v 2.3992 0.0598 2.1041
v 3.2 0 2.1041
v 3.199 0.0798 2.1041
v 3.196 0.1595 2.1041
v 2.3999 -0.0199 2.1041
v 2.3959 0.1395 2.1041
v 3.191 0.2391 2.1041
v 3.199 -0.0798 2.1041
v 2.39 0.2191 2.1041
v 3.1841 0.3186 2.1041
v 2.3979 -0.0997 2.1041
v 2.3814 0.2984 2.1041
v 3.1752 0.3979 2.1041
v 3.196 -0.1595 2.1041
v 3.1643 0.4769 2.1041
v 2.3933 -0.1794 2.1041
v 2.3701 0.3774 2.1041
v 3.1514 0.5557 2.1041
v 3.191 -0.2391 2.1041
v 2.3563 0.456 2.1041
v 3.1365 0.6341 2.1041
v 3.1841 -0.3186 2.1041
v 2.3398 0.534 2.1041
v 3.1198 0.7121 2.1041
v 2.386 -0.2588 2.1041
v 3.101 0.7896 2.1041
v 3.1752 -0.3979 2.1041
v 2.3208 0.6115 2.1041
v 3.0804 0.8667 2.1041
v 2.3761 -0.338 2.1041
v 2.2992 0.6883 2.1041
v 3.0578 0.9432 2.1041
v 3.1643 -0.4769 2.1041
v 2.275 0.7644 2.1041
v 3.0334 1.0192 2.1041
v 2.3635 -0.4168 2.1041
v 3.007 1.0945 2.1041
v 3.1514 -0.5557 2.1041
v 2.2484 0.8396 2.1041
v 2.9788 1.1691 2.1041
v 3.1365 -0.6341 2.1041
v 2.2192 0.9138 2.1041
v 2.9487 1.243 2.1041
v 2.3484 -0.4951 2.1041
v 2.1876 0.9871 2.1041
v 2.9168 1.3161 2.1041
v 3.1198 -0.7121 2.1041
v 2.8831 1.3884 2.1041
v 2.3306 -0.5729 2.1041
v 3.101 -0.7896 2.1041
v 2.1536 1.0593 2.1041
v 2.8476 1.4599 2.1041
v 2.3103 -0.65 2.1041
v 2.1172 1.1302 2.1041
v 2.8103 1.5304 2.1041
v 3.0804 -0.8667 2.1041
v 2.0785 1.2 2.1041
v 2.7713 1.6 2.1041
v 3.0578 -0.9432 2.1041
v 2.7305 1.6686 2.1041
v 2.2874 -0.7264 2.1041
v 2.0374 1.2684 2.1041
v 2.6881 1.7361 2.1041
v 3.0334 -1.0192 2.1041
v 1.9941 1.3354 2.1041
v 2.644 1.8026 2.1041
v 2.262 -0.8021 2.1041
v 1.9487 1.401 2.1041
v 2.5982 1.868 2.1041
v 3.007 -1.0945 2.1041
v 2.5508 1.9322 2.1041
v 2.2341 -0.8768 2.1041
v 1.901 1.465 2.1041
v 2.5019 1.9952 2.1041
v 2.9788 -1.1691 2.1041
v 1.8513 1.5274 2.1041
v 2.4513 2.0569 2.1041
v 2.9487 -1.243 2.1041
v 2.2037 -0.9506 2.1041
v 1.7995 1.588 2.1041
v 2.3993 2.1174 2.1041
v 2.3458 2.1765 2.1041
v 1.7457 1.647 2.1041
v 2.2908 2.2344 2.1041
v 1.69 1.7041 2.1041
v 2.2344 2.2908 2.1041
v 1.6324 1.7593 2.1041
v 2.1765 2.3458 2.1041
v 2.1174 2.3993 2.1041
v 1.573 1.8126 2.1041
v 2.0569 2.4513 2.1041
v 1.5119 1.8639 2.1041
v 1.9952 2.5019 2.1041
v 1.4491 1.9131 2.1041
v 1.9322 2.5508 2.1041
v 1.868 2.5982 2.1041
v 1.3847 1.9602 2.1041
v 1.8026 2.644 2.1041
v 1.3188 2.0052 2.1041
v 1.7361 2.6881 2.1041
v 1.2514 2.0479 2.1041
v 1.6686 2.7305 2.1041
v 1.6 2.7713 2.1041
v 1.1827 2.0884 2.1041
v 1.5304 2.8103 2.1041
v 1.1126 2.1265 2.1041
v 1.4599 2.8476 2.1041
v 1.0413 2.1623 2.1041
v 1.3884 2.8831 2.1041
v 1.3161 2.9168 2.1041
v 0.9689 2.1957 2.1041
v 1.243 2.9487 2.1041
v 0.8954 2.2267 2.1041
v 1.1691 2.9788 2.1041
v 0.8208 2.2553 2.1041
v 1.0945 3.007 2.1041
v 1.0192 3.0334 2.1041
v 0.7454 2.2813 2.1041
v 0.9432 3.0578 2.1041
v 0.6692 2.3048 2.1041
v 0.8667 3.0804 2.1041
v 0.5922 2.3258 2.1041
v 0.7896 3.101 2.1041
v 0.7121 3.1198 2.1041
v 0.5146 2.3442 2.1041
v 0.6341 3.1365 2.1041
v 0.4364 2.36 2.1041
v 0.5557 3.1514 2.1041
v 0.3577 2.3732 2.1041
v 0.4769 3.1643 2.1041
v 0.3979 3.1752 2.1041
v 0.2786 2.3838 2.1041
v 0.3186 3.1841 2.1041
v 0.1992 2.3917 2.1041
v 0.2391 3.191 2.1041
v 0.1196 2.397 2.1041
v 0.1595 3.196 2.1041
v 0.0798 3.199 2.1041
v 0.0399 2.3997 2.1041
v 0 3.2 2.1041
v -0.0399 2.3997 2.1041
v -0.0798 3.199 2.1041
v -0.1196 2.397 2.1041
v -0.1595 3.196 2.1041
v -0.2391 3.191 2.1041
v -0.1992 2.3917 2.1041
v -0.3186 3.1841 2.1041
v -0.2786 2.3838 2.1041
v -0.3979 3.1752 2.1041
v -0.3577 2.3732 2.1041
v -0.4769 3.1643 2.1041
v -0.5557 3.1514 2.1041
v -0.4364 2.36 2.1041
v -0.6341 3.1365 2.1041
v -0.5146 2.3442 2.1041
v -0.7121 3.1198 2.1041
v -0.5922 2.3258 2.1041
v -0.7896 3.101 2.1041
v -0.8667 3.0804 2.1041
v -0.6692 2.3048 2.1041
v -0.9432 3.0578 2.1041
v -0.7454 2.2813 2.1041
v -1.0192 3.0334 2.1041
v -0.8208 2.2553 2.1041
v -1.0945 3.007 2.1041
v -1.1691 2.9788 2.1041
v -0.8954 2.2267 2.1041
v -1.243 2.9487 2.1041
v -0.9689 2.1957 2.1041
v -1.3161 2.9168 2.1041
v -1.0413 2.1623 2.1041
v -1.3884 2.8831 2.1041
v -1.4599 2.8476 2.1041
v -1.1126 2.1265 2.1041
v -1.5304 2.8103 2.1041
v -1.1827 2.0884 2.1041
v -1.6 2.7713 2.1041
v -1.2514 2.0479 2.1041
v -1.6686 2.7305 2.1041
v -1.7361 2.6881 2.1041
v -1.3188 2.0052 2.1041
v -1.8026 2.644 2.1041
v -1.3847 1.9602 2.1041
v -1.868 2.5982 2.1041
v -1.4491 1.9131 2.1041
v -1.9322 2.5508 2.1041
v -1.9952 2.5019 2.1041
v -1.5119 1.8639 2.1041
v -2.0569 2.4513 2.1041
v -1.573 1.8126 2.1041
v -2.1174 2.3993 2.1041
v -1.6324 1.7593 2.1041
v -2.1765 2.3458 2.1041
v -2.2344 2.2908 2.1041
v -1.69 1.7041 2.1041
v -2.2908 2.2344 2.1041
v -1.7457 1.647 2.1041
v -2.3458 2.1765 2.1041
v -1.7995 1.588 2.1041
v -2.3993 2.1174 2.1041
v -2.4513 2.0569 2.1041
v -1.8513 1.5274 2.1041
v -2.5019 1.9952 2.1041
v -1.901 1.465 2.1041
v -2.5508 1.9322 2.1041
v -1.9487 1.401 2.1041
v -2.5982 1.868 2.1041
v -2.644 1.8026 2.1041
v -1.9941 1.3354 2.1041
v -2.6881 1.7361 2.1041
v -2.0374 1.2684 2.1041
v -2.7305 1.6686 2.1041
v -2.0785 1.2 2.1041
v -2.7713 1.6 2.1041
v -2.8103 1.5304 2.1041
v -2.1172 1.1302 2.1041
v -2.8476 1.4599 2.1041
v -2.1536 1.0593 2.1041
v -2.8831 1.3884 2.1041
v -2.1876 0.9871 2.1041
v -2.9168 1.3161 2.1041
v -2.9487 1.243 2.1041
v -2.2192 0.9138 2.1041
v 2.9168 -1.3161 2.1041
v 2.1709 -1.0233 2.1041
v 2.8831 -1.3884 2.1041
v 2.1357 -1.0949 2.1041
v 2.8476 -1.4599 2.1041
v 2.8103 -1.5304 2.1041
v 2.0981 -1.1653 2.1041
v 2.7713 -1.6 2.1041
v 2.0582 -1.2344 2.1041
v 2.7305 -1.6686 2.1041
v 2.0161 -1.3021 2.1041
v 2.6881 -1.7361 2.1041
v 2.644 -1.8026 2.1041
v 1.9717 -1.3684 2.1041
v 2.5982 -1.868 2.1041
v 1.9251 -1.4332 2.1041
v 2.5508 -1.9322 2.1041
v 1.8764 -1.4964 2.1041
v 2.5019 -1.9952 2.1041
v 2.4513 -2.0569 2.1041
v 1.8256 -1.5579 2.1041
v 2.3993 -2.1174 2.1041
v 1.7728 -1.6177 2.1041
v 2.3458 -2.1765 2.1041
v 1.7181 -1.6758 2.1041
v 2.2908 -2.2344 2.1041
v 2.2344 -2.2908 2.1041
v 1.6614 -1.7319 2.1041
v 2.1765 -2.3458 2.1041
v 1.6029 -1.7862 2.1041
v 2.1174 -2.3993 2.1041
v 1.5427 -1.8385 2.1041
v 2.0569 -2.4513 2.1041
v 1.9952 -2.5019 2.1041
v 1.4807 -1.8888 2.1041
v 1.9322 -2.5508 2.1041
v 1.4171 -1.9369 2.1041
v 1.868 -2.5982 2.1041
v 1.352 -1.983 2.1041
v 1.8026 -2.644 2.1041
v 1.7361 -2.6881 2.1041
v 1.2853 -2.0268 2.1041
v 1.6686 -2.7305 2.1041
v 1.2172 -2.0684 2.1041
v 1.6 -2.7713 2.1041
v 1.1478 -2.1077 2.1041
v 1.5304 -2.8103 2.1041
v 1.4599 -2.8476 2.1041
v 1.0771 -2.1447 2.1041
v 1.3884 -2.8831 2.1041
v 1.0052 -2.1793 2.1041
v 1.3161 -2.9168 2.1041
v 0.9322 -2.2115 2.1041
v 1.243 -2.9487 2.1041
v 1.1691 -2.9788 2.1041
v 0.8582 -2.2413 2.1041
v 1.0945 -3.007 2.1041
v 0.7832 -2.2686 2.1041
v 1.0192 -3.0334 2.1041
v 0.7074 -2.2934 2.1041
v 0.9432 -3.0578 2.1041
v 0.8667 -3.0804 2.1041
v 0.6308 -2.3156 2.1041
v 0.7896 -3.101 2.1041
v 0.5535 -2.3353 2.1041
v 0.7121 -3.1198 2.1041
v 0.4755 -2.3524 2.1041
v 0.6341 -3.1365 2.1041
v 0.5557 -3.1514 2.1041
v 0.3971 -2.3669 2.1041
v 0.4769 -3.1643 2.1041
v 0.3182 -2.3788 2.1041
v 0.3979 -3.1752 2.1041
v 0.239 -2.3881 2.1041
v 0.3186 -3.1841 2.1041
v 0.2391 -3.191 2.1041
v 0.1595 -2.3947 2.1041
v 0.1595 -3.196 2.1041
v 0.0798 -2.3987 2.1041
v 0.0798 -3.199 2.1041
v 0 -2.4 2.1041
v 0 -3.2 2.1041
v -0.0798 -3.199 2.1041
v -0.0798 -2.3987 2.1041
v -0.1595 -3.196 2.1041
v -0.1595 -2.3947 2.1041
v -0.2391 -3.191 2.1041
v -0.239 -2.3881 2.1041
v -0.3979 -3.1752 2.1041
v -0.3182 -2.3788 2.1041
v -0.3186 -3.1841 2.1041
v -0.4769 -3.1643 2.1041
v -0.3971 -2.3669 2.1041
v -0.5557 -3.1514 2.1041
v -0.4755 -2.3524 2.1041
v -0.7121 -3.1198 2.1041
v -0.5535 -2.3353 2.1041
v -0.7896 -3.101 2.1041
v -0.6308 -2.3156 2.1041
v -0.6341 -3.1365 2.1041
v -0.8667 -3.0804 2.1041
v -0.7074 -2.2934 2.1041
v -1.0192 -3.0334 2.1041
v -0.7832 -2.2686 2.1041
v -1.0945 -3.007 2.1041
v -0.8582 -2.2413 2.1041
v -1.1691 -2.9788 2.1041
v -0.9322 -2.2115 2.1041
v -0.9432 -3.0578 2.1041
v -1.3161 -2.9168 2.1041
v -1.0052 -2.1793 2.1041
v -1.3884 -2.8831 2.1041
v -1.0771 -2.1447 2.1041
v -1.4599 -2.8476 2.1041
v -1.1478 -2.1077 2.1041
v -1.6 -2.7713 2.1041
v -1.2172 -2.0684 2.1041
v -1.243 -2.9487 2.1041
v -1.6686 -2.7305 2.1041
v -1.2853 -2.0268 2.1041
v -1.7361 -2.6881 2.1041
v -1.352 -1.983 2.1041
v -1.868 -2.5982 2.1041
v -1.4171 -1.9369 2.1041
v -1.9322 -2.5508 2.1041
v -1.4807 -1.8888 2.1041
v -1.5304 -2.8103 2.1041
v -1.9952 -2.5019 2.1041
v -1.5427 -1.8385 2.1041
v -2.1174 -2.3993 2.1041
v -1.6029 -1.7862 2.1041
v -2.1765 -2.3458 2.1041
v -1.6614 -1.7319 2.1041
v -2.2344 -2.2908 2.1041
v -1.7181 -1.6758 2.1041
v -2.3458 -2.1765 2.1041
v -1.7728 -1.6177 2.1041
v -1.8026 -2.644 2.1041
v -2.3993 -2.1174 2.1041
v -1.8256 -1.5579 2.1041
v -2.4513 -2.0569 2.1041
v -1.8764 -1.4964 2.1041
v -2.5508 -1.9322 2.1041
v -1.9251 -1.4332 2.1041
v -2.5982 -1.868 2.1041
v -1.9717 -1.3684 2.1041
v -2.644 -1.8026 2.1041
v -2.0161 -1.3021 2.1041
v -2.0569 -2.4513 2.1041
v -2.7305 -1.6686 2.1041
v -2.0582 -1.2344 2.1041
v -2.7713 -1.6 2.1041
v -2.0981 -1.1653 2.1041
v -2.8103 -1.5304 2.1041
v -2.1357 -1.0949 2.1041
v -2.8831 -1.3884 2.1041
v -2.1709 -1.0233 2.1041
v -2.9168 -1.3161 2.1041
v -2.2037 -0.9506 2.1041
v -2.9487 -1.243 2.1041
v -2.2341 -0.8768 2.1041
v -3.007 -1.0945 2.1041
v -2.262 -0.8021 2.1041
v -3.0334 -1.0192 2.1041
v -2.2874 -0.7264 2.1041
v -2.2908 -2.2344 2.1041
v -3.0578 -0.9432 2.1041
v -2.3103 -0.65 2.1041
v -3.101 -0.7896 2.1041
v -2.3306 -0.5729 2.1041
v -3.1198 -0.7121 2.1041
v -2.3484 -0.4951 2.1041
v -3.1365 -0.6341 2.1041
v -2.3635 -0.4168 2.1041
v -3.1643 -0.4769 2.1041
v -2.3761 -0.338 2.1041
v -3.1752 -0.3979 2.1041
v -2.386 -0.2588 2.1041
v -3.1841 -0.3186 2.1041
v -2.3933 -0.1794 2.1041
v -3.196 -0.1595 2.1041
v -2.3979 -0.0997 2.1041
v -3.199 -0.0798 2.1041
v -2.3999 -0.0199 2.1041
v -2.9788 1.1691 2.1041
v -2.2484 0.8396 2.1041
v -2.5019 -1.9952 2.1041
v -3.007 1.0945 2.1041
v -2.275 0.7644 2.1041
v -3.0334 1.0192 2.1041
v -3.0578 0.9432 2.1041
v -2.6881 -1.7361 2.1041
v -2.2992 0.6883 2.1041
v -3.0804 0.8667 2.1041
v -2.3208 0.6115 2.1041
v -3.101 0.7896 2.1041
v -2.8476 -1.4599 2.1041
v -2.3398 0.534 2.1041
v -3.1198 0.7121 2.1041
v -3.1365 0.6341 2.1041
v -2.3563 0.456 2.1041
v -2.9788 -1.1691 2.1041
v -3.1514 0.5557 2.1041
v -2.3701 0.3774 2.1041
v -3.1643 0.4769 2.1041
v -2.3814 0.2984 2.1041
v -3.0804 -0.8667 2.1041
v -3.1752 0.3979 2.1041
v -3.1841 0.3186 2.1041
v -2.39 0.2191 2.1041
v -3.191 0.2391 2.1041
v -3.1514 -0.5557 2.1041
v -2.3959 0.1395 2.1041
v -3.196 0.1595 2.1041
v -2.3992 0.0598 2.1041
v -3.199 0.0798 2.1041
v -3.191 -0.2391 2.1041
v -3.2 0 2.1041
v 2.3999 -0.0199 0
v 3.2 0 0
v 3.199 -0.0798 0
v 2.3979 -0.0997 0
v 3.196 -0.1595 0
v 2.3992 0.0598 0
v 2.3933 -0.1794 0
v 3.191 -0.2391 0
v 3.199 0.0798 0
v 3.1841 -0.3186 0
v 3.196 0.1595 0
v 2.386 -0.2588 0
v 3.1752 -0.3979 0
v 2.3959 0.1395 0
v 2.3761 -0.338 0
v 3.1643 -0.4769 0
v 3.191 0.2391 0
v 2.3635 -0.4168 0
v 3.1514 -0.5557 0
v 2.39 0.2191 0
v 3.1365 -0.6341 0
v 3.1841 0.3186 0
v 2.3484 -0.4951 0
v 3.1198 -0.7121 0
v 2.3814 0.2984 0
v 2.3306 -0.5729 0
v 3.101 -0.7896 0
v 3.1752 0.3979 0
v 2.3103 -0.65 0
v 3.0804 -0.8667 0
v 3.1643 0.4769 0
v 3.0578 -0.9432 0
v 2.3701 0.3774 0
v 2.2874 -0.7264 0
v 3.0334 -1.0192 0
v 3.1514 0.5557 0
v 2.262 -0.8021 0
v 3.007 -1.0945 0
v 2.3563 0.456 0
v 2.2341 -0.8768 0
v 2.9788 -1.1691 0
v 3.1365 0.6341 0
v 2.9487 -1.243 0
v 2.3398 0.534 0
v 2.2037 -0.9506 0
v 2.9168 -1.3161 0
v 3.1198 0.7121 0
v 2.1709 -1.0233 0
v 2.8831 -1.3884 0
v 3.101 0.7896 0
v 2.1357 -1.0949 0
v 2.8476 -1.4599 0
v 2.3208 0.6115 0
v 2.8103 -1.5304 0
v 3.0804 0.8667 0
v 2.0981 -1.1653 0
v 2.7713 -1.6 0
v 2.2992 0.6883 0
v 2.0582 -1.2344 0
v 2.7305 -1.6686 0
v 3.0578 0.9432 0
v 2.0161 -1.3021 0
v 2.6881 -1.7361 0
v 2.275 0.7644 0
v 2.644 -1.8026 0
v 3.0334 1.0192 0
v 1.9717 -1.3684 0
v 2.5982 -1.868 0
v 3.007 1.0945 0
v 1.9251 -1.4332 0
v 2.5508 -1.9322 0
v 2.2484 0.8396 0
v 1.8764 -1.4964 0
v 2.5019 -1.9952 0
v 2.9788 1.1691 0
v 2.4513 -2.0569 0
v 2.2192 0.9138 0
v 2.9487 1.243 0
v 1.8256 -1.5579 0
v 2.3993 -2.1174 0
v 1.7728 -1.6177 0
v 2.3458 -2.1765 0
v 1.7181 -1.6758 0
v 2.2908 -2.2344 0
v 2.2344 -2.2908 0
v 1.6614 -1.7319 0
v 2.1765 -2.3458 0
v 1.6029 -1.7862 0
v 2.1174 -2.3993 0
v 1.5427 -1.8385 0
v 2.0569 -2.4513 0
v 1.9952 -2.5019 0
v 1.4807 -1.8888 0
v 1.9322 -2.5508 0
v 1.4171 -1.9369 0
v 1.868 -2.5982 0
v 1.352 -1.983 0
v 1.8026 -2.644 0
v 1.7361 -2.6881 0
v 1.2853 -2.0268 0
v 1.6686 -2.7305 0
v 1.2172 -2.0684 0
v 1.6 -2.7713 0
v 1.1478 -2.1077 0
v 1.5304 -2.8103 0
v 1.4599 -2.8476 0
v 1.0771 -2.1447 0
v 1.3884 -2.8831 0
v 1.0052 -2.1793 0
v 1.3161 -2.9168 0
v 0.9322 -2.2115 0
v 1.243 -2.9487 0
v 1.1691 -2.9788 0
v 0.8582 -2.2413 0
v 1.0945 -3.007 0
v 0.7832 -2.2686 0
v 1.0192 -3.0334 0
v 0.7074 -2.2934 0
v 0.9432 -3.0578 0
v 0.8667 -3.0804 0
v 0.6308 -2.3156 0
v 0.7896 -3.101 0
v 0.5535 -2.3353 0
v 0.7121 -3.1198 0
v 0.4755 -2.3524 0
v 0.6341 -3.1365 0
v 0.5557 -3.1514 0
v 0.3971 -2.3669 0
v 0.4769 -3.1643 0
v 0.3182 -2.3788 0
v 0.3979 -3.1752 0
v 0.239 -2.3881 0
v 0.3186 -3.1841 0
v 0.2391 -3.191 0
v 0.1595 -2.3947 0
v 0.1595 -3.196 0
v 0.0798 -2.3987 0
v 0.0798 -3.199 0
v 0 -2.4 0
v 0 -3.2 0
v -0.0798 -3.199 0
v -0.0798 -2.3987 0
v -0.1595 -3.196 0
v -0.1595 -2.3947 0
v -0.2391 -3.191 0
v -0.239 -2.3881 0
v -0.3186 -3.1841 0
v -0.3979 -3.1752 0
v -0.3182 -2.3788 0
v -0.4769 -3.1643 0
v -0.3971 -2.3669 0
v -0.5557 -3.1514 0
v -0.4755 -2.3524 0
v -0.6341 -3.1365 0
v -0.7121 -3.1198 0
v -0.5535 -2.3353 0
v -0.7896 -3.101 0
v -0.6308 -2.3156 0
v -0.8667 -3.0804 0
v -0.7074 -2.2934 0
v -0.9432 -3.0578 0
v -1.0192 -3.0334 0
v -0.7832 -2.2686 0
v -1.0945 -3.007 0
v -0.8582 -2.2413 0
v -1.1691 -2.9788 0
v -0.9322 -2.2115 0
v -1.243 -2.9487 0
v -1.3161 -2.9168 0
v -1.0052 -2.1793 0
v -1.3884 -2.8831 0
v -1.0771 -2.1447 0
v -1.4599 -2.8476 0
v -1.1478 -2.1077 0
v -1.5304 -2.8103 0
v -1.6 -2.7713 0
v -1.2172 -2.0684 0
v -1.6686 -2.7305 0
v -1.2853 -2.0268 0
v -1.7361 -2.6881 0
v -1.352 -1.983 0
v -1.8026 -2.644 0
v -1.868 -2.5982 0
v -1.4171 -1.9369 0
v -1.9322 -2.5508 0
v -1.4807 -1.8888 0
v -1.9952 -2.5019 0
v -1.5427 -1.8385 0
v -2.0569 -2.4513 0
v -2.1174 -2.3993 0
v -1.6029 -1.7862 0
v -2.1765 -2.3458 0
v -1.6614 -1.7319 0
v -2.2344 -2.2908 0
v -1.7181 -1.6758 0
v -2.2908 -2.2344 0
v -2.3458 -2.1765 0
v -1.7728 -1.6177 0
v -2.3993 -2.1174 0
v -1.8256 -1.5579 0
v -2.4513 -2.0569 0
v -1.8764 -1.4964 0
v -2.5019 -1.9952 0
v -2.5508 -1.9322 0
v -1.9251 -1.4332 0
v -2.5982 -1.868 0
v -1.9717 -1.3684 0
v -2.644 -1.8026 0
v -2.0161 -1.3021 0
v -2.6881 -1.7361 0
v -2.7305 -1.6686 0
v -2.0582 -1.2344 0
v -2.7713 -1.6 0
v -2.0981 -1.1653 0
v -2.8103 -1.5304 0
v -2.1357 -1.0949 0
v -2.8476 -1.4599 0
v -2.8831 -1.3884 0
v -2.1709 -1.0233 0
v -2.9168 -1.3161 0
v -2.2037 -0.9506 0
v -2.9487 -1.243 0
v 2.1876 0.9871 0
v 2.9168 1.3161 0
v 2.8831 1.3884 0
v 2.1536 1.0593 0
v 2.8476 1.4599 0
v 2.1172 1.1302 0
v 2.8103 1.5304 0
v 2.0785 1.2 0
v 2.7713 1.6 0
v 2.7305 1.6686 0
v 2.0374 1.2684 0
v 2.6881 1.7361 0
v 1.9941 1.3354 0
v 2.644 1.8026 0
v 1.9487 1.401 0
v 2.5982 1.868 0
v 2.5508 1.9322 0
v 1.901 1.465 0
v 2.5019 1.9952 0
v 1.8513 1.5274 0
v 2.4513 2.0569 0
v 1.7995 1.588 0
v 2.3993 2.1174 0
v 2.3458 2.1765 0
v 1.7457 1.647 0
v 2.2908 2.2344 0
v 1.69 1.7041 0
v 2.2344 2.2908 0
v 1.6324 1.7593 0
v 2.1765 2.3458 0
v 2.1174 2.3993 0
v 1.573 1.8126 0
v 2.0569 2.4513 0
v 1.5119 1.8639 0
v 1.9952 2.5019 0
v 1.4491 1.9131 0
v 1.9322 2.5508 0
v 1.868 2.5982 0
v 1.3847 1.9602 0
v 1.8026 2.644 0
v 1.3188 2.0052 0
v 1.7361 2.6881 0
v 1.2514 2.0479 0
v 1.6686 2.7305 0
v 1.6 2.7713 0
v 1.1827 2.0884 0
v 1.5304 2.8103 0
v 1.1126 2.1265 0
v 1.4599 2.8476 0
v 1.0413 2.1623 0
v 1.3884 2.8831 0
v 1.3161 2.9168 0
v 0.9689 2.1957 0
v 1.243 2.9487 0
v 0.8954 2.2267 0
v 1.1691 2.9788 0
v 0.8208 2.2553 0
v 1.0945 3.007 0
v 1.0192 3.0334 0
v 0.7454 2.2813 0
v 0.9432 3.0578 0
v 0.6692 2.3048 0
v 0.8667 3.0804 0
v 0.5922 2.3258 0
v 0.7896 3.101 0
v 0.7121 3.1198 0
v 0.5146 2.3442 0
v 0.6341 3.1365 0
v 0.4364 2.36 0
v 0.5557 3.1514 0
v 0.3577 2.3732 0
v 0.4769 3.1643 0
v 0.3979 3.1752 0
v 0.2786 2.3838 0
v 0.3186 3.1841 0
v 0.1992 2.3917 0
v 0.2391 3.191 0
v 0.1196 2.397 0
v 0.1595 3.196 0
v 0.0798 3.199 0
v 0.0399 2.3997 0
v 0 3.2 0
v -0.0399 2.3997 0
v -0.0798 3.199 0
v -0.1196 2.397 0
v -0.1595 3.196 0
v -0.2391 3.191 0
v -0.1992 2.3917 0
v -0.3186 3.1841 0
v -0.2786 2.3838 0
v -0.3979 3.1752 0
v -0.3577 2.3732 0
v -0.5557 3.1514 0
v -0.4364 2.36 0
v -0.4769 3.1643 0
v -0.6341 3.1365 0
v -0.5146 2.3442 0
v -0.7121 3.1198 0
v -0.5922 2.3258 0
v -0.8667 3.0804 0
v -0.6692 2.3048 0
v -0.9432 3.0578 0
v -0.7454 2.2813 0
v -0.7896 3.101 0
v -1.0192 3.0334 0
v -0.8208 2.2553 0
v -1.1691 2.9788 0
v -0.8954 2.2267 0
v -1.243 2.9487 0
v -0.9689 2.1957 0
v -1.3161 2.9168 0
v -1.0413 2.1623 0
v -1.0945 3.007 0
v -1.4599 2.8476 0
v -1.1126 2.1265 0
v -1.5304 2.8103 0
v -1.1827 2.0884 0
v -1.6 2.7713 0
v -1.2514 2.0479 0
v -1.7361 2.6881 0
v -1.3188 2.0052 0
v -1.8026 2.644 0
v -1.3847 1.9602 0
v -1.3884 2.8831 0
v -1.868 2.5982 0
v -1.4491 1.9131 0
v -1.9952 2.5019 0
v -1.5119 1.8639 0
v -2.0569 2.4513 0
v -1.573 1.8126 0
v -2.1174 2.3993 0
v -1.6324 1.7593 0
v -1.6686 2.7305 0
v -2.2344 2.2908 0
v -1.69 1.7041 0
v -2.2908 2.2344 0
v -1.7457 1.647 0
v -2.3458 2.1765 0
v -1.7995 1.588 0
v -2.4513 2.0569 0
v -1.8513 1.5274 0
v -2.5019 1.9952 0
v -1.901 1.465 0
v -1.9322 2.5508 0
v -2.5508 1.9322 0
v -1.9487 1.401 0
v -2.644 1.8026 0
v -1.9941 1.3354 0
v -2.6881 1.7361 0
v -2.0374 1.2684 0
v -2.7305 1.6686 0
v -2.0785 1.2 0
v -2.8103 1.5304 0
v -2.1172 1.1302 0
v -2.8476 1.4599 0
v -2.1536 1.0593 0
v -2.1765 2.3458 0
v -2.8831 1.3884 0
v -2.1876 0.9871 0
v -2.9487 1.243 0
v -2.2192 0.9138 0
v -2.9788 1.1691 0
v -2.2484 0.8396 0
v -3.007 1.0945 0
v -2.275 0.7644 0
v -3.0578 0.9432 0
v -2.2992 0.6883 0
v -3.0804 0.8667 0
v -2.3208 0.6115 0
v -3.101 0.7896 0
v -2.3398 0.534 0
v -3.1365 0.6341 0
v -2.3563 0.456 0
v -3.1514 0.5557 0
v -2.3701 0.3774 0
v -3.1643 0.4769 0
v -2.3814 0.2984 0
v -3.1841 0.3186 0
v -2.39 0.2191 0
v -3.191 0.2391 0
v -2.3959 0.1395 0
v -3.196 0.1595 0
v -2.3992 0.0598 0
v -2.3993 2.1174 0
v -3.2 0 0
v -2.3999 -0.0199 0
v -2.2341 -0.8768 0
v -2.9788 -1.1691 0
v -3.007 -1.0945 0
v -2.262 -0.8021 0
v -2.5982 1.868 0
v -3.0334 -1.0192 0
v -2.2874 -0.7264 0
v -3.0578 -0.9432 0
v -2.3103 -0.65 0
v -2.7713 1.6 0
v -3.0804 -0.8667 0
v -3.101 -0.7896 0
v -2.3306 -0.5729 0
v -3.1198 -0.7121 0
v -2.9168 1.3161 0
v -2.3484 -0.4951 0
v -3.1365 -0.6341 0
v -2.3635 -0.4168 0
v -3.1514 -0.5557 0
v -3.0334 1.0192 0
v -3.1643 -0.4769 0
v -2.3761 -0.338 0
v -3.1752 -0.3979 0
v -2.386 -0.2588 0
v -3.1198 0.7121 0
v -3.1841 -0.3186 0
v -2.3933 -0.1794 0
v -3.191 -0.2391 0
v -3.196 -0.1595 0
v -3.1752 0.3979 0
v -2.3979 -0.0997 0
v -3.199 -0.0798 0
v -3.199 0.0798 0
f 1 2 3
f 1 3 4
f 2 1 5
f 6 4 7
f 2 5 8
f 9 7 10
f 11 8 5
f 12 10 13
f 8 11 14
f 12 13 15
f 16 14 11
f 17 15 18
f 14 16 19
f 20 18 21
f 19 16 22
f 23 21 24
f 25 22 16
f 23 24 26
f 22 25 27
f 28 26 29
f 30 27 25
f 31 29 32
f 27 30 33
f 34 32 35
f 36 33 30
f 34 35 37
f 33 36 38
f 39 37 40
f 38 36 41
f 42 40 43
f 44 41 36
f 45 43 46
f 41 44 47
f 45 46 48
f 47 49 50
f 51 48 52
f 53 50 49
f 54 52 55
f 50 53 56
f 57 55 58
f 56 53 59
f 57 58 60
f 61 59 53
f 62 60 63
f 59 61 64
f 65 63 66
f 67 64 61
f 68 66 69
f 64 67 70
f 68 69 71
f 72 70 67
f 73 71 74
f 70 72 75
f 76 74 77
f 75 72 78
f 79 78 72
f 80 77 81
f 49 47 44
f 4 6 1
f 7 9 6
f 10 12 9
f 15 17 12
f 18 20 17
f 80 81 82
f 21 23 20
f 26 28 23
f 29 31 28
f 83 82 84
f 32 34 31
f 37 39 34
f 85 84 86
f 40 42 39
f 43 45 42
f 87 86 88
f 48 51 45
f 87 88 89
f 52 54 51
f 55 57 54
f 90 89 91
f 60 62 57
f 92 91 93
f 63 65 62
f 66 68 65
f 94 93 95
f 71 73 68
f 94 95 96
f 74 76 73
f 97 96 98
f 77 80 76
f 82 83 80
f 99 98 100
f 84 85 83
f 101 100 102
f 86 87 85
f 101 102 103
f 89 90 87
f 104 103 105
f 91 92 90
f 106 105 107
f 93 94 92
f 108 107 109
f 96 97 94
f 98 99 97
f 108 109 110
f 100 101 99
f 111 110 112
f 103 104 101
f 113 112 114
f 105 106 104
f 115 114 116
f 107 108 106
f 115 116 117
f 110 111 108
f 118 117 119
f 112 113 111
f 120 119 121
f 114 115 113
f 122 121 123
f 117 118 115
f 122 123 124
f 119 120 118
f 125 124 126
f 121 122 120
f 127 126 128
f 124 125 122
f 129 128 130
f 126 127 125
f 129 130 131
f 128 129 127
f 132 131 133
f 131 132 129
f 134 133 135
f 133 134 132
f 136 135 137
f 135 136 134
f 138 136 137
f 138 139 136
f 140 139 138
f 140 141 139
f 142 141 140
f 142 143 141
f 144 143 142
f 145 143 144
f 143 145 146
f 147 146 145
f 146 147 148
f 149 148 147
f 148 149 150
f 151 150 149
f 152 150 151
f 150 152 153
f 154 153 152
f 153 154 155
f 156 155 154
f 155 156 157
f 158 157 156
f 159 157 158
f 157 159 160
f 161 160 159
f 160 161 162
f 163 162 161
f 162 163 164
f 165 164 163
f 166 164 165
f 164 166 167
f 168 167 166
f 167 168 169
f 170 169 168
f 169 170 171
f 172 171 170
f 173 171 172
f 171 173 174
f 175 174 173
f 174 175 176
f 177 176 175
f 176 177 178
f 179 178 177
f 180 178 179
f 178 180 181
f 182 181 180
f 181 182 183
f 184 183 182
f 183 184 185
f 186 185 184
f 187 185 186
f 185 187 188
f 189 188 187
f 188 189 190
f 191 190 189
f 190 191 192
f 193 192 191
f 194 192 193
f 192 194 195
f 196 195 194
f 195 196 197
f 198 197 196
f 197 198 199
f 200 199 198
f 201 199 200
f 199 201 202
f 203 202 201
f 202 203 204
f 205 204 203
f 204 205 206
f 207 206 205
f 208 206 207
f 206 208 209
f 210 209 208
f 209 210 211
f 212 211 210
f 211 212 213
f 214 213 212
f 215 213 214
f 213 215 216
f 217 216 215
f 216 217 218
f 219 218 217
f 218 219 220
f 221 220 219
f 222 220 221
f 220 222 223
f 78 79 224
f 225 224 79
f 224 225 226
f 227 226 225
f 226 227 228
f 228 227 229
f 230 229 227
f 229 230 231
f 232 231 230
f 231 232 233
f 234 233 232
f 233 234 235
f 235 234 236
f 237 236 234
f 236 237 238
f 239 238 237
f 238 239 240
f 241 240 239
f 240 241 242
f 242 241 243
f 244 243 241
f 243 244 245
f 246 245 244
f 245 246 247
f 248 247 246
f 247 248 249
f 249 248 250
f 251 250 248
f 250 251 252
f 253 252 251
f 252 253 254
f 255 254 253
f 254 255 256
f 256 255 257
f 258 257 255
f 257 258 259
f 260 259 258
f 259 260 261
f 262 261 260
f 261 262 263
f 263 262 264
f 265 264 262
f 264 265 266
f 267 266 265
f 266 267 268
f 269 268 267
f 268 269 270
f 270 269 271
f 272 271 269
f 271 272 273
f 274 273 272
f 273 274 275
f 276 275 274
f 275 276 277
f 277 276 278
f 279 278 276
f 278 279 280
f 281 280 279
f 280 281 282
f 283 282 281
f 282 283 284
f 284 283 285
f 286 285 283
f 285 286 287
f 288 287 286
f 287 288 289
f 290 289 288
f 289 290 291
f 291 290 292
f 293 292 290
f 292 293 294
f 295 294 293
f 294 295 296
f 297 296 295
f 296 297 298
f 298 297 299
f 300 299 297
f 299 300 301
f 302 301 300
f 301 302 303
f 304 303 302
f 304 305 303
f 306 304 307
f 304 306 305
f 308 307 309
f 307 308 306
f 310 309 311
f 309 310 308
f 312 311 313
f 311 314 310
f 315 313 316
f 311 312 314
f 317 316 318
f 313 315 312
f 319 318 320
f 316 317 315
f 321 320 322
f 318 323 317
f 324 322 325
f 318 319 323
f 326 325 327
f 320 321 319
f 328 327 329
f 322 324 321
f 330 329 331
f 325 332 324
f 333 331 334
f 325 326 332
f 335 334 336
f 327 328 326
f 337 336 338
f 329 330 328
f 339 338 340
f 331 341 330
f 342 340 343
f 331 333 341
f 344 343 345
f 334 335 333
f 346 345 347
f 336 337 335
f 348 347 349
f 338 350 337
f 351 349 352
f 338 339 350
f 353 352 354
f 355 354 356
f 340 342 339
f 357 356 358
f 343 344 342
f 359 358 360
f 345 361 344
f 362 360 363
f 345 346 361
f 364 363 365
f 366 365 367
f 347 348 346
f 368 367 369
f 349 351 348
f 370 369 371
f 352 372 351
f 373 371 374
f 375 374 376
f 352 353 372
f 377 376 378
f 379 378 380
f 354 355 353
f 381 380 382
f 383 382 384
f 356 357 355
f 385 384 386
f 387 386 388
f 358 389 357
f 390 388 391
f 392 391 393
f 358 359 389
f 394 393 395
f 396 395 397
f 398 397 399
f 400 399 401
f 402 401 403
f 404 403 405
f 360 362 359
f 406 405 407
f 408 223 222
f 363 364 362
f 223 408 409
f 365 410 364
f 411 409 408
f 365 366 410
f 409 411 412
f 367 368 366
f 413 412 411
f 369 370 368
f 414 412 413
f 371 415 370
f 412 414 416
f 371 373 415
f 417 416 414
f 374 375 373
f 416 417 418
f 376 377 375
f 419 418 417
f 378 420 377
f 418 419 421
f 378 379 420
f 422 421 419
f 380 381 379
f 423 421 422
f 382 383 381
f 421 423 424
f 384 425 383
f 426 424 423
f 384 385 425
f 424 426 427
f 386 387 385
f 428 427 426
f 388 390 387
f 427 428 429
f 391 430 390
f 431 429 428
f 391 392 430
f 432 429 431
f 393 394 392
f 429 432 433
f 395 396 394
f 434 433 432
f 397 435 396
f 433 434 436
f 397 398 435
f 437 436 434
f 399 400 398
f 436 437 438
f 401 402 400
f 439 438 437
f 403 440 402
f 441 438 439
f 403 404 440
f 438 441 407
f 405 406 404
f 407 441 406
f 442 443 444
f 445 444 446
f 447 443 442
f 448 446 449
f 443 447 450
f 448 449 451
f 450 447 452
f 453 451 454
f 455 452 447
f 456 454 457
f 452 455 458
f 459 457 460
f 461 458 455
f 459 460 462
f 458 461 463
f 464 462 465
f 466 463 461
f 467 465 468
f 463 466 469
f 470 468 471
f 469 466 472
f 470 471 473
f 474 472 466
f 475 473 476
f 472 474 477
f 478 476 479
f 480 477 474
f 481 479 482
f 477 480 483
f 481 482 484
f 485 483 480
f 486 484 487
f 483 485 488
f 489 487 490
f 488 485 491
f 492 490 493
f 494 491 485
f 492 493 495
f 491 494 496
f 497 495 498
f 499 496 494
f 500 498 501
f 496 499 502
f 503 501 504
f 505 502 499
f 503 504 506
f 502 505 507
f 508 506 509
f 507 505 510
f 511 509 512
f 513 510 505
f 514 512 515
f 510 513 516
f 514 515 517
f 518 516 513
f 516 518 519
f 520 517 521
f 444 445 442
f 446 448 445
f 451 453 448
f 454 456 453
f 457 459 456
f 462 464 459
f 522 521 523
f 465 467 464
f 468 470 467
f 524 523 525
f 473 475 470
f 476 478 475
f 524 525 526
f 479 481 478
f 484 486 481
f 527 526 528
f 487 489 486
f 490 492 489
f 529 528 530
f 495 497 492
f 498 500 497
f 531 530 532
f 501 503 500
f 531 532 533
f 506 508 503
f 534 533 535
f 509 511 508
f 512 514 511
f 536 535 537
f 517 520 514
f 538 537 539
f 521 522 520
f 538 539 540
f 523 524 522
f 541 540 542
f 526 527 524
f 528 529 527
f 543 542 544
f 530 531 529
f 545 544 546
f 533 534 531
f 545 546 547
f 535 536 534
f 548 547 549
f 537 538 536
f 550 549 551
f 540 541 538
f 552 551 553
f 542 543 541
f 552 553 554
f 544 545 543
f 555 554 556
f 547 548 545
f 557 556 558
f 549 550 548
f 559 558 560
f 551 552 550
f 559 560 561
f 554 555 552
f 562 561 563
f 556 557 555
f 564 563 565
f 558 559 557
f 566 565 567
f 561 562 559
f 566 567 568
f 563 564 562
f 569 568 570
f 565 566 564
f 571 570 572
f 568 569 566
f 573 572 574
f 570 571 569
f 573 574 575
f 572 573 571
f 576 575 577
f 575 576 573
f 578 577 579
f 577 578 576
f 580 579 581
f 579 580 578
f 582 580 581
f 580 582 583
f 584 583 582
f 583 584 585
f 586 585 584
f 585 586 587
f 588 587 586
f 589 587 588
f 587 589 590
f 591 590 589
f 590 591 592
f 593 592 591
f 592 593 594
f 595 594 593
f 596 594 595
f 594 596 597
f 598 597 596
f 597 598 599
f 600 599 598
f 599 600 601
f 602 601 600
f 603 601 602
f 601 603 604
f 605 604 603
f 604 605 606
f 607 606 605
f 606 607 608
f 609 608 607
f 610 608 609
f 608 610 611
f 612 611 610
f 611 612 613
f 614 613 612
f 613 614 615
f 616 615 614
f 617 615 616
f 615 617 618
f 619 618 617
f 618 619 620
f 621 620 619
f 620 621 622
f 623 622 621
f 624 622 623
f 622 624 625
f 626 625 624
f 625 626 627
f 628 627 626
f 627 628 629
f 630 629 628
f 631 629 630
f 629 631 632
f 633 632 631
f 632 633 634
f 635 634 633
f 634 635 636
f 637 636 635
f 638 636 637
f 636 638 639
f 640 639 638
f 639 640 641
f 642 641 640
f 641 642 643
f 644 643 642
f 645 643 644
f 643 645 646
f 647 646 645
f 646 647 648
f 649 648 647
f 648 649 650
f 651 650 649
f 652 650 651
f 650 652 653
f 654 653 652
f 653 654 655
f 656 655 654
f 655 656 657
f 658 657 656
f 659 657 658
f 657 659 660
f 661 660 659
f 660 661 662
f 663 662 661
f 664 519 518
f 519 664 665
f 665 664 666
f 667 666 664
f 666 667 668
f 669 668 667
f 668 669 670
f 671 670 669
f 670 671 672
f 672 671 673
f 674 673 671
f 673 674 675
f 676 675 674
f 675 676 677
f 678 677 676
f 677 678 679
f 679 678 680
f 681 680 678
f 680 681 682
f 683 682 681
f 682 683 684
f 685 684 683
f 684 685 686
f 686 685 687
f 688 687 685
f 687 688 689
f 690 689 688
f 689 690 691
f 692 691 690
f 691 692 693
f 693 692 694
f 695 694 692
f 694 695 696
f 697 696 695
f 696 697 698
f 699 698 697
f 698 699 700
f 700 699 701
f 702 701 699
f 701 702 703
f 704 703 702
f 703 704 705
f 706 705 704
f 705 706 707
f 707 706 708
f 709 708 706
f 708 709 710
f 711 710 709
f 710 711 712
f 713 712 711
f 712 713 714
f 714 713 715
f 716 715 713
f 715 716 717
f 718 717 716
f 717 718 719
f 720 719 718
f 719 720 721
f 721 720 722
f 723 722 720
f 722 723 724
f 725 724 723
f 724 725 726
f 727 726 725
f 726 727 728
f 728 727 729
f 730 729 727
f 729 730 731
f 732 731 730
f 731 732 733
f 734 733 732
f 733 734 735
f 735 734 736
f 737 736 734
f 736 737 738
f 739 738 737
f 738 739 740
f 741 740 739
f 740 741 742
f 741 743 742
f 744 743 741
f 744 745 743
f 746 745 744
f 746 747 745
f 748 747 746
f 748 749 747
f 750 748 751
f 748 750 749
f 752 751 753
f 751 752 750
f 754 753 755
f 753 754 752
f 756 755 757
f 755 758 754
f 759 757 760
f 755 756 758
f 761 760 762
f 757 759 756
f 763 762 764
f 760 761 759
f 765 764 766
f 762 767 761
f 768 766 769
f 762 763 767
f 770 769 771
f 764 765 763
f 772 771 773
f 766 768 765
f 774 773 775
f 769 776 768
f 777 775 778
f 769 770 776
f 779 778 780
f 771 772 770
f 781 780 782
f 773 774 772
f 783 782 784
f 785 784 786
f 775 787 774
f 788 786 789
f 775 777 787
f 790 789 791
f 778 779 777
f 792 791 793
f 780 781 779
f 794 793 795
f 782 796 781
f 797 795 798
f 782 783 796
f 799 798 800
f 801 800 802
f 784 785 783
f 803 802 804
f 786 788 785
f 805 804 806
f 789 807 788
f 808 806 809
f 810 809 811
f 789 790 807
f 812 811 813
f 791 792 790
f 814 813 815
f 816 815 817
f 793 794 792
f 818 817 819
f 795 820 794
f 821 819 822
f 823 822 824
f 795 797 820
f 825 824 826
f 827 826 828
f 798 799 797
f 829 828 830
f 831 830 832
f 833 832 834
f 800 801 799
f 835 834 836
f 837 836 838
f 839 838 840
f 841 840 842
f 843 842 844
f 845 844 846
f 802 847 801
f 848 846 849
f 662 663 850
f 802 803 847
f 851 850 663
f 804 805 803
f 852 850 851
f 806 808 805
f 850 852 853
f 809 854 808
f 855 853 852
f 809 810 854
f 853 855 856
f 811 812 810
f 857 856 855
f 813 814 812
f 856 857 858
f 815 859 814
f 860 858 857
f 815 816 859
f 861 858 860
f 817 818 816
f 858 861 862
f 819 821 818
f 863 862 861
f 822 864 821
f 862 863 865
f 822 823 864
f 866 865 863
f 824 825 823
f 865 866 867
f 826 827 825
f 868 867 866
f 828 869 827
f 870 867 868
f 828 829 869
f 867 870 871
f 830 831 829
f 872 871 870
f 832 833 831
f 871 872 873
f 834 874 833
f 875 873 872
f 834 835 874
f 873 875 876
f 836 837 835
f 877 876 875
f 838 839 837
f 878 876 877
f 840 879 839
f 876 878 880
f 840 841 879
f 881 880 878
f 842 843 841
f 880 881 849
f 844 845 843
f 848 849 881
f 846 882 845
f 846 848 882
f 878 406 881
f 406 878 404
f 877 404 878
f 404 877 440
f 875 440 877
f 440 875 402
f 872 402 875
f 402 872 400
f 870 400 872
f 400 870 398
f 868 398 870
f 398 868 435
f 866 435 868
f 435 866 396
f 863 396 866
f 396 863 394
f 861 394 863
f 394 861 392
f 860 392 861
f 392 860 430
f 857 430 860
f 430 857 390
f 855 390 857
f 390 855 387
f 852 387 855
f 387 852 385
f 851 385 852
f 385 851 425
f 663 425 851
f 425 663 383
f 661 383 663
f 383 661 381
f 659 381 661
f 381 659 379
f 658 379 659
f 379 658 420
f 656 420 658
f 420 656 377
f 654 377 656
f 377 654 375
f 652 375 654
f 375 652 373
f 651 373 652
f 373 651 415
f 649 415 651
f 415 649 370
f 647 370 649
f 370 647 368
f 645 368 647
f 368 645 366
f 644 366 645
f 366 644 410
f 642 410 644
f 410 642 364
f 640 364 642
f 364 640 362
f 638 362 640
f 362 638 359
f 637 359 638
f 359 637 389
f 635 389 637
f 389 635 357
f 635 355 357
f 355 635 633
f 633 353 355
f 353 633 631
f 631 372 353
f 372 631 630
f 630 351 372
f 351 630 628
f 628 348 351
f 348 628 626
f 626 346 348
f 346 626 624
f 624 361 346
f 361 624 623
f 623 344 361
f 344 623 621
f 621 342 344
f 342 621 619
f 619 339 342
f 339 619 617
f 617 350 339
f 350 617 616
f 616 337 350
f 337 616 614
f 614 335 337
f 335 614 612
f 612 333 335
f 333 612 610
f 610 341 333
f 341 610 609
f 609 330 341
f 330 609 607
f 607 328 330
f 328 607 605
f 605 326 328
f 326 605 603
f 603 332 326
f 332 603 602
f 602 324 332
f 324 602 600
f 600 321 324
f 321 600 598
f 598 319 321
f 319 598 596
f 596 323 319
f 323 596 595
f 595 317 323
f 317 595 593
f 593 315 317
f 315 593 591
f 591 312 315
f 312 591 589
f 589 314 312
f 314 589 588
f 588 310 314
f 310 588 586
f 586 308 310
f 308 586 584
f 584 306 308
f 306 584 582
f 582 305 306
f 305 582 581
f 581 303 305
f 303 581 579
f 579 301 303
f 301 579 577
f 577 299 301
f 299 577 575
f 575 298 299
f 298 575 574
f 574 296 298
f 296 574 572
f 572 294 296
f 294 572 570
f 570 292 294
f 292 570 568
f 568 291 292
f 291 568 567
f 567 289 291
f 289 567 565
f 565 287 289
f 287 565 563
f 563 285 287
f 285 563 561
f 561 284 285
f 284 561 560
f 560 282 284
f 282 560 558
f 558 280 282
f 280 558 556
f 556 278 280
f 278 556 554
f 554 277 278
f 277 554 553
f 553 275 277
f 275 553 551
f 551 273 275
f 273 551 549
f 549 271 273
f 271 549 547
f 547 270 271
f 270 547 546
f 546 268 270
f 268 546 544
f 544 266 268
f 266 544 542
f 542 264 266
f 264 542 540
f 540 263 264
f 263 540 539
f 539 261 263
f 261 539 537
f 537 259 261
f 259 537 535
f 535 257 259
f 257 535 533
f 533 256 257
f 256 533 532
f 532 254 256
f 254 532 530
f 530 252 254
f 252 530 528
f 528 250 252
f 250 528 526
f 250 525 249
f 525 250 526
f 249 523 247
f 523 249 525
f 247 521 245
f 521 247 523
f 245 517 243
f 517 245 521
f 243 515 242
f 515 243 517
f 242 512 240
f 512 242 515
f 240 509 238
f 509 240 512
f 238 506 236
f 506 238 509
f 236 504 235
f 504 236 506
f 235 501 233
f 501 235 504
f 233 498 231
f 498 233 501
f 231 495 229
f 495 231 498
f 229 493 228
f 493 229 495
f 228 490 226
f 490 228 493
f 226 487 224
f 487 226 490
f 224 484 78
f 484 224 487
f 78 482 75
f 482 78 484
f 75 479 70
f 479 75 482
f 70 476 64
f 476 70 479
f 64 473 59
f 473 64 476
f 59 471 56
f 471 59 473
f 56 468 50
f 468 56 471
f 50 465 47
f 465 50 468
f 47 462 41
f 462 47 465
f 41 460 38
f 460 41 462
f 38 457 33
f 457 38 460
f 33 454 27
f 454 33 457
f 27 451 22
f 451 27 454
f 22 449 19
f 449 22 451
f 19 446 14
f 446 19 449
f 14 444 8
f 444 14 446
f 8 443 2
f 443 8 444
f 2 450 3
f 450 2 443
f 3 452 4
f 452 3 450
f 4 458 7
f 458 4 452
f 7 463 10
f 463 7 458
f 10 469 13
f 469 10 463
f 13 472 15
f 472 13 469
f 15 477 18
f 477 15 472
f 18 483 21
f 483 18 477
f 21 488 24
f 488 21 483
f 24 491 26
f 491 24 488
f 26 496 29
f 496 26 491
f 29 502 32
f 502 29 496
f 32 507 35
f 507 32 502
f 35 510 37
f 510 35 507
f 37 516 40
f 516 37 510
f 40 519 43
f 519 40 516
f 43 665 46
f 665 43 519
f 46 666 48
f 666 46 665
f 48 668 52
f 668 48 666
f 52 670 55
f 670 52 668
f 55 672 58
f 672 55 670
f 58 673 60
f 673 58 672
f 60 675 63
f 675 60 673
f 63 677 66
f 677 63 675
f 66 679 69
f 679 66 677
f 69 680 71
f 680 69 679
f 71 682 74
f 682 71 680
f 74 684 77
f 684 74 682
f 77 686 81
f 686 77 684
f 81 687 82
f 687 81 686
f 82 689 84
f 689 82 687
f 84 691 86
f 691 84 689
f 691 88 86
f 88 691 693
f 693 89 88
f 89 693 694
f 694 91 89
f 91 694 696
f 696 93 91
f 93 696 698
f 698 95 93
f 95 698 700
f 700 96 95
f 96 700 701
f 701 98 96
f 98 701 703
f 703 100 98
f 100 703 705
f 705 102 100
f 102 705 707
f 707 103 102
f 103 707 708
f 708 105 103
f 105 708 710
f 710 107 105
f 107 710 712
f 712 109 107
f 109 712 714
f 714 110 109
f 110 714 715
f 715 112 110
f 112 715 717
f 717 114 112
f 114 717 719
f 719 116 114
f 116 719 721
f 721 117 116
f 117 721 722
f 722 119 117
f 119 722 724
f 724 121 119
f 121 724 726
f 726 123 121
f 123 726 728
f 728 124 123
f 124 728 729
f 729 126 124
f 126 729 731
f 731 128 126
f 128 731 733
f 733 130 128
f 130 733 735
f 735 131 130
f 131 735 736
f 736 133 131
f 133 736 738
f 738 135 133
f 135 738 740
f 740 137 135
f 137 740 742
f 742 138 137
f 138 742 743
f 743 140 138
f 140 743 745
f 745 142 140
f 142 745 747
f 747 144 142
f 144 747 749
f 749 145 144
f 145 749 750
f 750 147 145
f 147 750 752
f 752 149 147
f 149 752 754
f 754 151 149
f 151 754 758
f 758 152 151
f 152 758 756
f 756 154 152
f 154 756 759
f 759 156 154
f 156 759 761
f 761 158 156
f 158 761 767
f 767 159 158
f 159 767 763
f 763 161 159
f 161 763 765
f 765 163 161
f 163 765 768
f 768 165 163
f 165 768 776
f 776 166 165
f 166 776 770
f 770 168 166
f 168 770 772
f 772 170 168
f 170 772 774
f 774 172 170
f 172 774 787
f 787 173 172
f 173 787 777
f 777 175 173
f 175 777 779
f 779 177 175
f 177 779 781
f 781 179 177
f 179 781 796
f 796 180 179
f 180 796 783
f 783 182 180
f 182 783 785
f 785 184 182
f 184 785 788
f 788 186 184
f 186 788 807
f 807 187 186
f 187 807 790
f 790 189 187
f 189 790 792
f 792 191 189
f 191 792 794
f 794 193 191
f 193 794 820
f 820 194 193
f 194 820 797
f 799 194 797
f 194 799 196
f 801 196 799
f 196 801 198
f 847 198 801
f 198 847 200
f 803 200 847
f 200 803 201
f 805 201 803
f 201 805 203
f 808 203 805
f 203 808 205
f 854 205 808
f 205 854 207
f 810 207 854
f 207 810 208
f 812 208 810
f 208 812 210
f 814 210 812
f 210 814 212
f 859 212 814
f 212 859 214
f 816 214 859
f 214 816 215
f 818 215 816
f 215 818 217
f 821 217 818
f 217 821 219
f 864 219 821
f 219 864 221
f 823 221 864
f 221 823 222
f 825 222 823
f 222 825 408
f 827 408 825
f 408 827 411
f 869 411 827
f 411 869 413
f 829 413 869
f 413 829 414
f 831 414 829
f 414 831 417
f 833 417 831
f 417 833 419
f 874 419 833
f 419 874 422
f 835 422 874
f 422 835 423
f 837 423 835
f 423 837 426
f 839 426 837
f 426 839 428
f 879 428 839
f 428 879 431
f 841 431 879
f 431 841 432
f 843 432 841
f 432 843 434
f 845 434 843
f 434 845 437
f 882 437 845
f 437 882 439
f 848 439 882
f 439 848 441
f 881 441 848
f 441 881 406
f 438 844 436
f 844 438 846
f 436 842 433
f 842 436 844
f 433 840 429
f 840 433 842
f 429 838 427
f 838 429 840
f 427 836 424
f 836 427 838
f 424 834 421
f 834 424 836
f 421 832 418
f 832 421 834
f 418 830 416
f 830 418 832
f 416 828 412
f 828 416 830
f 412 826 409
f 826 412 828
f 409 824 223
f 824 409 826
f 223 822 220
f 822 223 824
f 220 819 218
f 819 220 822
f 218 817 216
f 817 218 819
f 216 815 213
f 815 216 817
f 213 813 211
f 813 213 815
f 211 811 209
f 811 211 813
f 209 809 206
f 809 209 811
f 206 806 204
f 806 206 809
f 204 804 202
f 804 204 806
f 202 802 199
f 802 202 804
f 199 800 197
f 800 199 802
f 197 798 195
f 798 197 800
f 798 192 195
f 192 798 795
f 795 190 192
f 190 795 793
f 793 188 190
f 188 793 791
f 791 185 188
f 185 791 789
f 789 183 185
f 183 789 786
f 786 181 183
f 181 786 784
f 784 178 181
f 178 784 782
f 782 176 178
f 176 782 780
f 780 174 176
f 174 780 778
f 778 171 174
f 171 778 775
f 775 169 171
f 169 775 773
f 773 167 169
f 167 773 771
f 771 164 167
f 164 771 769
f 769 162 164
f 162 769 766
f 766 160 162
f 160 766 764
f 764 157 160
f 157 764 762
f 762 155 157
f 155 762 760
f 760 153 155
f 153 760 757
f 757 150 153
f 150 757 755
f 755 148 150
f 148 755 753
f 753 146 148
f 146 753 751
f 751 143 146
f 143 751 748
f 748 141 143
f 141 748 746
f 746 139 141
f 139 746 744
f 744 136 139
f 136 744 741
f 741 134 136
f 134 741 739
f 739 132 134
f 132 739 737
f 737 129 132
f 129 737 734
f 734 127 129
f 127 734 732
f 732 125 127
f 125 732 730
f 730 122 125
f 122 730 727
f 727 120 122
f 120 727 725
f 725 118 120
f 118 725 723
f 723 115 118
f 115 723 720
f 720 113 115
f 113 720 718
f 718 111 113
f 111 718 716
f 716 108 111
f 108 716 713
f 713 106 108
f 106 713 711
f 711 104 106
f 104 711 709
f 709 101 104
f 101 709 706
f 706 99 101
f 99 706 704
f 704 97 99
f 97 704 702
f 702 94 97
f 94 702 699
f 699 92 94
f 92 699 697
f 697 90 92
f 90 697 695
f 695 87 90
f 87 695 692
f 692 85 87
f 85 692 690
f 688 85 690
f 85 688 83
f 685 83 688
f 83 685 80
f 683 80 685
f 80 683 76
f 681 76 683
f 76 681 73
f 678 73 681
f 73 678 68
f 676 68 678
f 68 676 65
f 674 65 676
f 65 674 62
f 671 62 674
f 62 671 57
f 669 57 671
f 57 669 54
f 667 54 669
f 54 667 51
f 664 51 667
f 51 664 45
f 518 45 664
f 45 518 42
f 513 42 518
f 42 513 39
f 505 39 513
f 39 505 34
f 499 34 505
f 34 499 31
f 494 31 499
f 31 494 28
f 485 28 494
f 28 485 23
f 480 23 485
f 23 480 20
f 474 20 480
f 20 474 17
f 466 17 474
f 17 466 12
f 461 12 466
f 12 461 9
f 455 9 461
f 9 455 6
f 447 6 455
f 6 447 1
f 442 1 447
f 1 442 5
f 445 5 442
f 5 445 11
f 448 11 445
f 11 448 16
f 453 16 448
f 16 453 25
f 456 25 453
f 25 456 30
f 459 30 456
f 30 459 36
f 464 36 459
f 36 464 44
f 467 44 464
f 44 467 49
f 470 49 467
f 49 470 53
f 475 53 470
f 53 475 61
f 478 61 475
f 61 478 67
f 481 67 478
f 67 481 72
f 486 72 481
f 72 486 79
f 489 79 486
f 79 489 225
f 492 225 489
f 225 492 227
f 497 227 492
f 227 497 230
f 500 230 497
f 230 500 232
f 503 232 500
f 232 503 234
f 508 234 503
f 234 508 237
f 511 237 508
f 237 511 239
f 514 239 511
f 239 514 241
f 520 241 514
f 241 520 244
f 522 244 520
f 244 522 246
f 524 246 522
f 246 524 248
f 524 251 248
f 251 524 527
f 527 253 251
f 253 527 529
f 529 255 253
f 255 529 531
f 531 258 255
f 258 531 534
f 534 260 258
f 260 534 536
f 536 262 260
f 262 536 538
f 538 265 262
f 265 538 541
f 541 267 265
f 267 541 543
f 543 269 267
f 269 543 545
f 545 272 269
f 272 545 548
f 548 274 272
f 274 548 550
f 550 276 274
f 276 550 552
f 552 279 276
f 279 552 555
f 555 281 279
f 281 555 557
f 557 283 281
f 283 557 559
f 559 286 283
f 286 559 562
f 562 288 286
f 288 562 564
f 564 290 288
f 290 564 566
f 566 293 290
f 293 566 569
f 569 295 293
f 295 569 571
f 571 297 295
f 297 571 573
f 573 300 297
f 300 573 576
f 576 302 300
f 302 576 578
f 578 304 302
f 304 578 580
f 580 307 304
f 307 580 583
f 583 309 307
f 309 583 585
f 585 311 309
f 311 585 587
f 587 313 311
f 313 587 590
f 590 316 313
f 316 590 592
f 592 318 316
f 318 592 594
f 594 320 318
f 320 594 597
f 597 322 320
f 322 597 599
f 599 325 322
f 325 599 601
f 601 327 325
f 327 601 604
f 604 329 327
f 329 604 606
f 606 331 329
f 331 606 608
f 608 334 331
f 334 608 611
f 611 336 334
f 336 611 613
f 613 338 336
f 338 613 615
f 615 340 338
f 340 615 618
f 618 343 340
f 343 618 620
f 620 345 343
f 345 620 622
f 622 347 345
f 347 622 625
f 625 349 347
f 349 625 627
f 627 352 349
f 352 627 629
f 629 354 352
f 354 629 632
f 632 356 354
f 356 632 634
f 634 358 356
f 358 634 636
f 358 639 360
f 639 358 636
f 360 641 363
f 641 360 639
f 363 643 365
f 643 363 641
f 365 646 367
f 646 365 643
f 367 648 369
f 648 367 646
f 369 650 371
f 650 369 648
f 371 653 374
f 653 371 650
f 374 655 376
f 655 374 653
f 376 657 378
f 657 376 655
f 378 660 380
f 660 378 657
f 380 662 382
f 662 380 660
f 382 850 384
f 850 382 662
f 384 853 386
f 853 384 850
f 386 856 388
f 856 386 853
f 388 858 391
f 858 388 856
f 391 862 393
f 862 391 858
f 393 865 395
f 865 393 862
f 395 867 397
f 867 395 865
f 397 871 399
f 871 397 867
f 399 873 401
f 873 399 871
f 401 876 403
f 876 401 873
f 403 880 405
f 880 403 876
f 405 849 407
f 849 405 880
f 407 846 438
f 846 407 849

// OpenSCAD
use <../lib.scad>
use <s/92084s01.scad>
use <s/92084s02.scad>
use <s/92084s03.scad>
use <s/92084s04.scad>
use <s/92084s05.scad>
$fa=1; $fs=0.2;
function ldraw_lib__92084(realsolid=false) = [
// 0 Animal Owl with Angular Feathers
// 0 Name: 92084.dat
// 0 Author: Magnus Forsberg [MagFors]
// 0 !LDRAW_ORG Part UPDATE 2022-03
// 0 !LICENSE Licensed under CC BY 2.0 and CC BY 4.0 : see CAreadme.txt
// 
// 0 BFC CERTIFY CCW
  [0,"BFC","CERTIFY"],
  [0,"BFC","CCW"],
// 
// 0 !HISTORY 2013-08-14 {LEGO Digital Designer} Original part shape
// 0 !HISTORY 2021-08-07 [MagFors] File preparation for LDraw Parts Tracker
// 0 !HISTORY 2022-05-07 [PTadmin] Official Update 2022-03
// 
// 
// 1 16 0 0 0 1 0 0 0 1 0 0 0 1 s\92084s01.dat
  [1,16,0,0,0,1,0,0,0,1,0,0,0,1, ldraw_lib__s__92084s01(realsolid)],
// 0 // face
// 1 16 0 0 0 1 0 0 0 1 0 0 0 1 s\92084s02.dat
  [1,16,0,0,0,1,0,0,0,1,0,0,0,1, ldraw_lib__s__92084s02(realsolid)],
// 1 16 0 0 0 -1 0 0 0 1 0 0 0 1 s\92084s02.dat
  [1,16,0,0,0,-1,0,0,0,1,0,0,0,1, ldraw_lib__s__92084s02(realsolid)],
// 0 // belly
// 1 16 0 0 0 1 0 0 0 1 0 0 0 1 s\92084s03.dat
  [1,16,0,0,0,1,0,0,0,1,0,0,0,1, ldraw_lib__s__92084s03(realsolid)],
// 1 16 0 0 0 -1 0 0 0 1 0 0 0 1 s\92084s03.dat
  [1,16,0,0,0,-1,0,0,0,1,0,0,0,1, ldraw_lib__s__92084s03(realsolid)],
// 0 // beak
// 1 16 0 0 0 1 0 0 0 1 0 0 0 1 s\92084s04.dat
  [1,16,0,0,0,1,0,0,0,1,0,0,0,1, ldraw_lib__s__92084s04(realsolid)],
// 0 // eye
// 1 16 0 0 0 1 0 0 0 1 0 0 0 1 s\92084s05.dat
  [1,16,0,0,0,1,0,0,0,1,0,0,0,1, ldraw_lib__s__92084s05(realsolid)],
// 1 16 0 0 0 -1 0 0 0 1 0 0 0 1 s\92084s05.dat
  [1,16,0,0,0,-1,0,0,0,1,0,0,0,1, ldraw_lib__s__92084s05(realsolid)],
];
module ldraw_lib__92084(step=0, col=false, unit=2/5, alt=false, line=0.2, solid=!$preview)
    makepoly(ldraw_lib__92084(solid), step=step, col=col, unit=unit, alt=alt, line=line, solid=solid);
ldraw_lib__92084(line=0.2);
